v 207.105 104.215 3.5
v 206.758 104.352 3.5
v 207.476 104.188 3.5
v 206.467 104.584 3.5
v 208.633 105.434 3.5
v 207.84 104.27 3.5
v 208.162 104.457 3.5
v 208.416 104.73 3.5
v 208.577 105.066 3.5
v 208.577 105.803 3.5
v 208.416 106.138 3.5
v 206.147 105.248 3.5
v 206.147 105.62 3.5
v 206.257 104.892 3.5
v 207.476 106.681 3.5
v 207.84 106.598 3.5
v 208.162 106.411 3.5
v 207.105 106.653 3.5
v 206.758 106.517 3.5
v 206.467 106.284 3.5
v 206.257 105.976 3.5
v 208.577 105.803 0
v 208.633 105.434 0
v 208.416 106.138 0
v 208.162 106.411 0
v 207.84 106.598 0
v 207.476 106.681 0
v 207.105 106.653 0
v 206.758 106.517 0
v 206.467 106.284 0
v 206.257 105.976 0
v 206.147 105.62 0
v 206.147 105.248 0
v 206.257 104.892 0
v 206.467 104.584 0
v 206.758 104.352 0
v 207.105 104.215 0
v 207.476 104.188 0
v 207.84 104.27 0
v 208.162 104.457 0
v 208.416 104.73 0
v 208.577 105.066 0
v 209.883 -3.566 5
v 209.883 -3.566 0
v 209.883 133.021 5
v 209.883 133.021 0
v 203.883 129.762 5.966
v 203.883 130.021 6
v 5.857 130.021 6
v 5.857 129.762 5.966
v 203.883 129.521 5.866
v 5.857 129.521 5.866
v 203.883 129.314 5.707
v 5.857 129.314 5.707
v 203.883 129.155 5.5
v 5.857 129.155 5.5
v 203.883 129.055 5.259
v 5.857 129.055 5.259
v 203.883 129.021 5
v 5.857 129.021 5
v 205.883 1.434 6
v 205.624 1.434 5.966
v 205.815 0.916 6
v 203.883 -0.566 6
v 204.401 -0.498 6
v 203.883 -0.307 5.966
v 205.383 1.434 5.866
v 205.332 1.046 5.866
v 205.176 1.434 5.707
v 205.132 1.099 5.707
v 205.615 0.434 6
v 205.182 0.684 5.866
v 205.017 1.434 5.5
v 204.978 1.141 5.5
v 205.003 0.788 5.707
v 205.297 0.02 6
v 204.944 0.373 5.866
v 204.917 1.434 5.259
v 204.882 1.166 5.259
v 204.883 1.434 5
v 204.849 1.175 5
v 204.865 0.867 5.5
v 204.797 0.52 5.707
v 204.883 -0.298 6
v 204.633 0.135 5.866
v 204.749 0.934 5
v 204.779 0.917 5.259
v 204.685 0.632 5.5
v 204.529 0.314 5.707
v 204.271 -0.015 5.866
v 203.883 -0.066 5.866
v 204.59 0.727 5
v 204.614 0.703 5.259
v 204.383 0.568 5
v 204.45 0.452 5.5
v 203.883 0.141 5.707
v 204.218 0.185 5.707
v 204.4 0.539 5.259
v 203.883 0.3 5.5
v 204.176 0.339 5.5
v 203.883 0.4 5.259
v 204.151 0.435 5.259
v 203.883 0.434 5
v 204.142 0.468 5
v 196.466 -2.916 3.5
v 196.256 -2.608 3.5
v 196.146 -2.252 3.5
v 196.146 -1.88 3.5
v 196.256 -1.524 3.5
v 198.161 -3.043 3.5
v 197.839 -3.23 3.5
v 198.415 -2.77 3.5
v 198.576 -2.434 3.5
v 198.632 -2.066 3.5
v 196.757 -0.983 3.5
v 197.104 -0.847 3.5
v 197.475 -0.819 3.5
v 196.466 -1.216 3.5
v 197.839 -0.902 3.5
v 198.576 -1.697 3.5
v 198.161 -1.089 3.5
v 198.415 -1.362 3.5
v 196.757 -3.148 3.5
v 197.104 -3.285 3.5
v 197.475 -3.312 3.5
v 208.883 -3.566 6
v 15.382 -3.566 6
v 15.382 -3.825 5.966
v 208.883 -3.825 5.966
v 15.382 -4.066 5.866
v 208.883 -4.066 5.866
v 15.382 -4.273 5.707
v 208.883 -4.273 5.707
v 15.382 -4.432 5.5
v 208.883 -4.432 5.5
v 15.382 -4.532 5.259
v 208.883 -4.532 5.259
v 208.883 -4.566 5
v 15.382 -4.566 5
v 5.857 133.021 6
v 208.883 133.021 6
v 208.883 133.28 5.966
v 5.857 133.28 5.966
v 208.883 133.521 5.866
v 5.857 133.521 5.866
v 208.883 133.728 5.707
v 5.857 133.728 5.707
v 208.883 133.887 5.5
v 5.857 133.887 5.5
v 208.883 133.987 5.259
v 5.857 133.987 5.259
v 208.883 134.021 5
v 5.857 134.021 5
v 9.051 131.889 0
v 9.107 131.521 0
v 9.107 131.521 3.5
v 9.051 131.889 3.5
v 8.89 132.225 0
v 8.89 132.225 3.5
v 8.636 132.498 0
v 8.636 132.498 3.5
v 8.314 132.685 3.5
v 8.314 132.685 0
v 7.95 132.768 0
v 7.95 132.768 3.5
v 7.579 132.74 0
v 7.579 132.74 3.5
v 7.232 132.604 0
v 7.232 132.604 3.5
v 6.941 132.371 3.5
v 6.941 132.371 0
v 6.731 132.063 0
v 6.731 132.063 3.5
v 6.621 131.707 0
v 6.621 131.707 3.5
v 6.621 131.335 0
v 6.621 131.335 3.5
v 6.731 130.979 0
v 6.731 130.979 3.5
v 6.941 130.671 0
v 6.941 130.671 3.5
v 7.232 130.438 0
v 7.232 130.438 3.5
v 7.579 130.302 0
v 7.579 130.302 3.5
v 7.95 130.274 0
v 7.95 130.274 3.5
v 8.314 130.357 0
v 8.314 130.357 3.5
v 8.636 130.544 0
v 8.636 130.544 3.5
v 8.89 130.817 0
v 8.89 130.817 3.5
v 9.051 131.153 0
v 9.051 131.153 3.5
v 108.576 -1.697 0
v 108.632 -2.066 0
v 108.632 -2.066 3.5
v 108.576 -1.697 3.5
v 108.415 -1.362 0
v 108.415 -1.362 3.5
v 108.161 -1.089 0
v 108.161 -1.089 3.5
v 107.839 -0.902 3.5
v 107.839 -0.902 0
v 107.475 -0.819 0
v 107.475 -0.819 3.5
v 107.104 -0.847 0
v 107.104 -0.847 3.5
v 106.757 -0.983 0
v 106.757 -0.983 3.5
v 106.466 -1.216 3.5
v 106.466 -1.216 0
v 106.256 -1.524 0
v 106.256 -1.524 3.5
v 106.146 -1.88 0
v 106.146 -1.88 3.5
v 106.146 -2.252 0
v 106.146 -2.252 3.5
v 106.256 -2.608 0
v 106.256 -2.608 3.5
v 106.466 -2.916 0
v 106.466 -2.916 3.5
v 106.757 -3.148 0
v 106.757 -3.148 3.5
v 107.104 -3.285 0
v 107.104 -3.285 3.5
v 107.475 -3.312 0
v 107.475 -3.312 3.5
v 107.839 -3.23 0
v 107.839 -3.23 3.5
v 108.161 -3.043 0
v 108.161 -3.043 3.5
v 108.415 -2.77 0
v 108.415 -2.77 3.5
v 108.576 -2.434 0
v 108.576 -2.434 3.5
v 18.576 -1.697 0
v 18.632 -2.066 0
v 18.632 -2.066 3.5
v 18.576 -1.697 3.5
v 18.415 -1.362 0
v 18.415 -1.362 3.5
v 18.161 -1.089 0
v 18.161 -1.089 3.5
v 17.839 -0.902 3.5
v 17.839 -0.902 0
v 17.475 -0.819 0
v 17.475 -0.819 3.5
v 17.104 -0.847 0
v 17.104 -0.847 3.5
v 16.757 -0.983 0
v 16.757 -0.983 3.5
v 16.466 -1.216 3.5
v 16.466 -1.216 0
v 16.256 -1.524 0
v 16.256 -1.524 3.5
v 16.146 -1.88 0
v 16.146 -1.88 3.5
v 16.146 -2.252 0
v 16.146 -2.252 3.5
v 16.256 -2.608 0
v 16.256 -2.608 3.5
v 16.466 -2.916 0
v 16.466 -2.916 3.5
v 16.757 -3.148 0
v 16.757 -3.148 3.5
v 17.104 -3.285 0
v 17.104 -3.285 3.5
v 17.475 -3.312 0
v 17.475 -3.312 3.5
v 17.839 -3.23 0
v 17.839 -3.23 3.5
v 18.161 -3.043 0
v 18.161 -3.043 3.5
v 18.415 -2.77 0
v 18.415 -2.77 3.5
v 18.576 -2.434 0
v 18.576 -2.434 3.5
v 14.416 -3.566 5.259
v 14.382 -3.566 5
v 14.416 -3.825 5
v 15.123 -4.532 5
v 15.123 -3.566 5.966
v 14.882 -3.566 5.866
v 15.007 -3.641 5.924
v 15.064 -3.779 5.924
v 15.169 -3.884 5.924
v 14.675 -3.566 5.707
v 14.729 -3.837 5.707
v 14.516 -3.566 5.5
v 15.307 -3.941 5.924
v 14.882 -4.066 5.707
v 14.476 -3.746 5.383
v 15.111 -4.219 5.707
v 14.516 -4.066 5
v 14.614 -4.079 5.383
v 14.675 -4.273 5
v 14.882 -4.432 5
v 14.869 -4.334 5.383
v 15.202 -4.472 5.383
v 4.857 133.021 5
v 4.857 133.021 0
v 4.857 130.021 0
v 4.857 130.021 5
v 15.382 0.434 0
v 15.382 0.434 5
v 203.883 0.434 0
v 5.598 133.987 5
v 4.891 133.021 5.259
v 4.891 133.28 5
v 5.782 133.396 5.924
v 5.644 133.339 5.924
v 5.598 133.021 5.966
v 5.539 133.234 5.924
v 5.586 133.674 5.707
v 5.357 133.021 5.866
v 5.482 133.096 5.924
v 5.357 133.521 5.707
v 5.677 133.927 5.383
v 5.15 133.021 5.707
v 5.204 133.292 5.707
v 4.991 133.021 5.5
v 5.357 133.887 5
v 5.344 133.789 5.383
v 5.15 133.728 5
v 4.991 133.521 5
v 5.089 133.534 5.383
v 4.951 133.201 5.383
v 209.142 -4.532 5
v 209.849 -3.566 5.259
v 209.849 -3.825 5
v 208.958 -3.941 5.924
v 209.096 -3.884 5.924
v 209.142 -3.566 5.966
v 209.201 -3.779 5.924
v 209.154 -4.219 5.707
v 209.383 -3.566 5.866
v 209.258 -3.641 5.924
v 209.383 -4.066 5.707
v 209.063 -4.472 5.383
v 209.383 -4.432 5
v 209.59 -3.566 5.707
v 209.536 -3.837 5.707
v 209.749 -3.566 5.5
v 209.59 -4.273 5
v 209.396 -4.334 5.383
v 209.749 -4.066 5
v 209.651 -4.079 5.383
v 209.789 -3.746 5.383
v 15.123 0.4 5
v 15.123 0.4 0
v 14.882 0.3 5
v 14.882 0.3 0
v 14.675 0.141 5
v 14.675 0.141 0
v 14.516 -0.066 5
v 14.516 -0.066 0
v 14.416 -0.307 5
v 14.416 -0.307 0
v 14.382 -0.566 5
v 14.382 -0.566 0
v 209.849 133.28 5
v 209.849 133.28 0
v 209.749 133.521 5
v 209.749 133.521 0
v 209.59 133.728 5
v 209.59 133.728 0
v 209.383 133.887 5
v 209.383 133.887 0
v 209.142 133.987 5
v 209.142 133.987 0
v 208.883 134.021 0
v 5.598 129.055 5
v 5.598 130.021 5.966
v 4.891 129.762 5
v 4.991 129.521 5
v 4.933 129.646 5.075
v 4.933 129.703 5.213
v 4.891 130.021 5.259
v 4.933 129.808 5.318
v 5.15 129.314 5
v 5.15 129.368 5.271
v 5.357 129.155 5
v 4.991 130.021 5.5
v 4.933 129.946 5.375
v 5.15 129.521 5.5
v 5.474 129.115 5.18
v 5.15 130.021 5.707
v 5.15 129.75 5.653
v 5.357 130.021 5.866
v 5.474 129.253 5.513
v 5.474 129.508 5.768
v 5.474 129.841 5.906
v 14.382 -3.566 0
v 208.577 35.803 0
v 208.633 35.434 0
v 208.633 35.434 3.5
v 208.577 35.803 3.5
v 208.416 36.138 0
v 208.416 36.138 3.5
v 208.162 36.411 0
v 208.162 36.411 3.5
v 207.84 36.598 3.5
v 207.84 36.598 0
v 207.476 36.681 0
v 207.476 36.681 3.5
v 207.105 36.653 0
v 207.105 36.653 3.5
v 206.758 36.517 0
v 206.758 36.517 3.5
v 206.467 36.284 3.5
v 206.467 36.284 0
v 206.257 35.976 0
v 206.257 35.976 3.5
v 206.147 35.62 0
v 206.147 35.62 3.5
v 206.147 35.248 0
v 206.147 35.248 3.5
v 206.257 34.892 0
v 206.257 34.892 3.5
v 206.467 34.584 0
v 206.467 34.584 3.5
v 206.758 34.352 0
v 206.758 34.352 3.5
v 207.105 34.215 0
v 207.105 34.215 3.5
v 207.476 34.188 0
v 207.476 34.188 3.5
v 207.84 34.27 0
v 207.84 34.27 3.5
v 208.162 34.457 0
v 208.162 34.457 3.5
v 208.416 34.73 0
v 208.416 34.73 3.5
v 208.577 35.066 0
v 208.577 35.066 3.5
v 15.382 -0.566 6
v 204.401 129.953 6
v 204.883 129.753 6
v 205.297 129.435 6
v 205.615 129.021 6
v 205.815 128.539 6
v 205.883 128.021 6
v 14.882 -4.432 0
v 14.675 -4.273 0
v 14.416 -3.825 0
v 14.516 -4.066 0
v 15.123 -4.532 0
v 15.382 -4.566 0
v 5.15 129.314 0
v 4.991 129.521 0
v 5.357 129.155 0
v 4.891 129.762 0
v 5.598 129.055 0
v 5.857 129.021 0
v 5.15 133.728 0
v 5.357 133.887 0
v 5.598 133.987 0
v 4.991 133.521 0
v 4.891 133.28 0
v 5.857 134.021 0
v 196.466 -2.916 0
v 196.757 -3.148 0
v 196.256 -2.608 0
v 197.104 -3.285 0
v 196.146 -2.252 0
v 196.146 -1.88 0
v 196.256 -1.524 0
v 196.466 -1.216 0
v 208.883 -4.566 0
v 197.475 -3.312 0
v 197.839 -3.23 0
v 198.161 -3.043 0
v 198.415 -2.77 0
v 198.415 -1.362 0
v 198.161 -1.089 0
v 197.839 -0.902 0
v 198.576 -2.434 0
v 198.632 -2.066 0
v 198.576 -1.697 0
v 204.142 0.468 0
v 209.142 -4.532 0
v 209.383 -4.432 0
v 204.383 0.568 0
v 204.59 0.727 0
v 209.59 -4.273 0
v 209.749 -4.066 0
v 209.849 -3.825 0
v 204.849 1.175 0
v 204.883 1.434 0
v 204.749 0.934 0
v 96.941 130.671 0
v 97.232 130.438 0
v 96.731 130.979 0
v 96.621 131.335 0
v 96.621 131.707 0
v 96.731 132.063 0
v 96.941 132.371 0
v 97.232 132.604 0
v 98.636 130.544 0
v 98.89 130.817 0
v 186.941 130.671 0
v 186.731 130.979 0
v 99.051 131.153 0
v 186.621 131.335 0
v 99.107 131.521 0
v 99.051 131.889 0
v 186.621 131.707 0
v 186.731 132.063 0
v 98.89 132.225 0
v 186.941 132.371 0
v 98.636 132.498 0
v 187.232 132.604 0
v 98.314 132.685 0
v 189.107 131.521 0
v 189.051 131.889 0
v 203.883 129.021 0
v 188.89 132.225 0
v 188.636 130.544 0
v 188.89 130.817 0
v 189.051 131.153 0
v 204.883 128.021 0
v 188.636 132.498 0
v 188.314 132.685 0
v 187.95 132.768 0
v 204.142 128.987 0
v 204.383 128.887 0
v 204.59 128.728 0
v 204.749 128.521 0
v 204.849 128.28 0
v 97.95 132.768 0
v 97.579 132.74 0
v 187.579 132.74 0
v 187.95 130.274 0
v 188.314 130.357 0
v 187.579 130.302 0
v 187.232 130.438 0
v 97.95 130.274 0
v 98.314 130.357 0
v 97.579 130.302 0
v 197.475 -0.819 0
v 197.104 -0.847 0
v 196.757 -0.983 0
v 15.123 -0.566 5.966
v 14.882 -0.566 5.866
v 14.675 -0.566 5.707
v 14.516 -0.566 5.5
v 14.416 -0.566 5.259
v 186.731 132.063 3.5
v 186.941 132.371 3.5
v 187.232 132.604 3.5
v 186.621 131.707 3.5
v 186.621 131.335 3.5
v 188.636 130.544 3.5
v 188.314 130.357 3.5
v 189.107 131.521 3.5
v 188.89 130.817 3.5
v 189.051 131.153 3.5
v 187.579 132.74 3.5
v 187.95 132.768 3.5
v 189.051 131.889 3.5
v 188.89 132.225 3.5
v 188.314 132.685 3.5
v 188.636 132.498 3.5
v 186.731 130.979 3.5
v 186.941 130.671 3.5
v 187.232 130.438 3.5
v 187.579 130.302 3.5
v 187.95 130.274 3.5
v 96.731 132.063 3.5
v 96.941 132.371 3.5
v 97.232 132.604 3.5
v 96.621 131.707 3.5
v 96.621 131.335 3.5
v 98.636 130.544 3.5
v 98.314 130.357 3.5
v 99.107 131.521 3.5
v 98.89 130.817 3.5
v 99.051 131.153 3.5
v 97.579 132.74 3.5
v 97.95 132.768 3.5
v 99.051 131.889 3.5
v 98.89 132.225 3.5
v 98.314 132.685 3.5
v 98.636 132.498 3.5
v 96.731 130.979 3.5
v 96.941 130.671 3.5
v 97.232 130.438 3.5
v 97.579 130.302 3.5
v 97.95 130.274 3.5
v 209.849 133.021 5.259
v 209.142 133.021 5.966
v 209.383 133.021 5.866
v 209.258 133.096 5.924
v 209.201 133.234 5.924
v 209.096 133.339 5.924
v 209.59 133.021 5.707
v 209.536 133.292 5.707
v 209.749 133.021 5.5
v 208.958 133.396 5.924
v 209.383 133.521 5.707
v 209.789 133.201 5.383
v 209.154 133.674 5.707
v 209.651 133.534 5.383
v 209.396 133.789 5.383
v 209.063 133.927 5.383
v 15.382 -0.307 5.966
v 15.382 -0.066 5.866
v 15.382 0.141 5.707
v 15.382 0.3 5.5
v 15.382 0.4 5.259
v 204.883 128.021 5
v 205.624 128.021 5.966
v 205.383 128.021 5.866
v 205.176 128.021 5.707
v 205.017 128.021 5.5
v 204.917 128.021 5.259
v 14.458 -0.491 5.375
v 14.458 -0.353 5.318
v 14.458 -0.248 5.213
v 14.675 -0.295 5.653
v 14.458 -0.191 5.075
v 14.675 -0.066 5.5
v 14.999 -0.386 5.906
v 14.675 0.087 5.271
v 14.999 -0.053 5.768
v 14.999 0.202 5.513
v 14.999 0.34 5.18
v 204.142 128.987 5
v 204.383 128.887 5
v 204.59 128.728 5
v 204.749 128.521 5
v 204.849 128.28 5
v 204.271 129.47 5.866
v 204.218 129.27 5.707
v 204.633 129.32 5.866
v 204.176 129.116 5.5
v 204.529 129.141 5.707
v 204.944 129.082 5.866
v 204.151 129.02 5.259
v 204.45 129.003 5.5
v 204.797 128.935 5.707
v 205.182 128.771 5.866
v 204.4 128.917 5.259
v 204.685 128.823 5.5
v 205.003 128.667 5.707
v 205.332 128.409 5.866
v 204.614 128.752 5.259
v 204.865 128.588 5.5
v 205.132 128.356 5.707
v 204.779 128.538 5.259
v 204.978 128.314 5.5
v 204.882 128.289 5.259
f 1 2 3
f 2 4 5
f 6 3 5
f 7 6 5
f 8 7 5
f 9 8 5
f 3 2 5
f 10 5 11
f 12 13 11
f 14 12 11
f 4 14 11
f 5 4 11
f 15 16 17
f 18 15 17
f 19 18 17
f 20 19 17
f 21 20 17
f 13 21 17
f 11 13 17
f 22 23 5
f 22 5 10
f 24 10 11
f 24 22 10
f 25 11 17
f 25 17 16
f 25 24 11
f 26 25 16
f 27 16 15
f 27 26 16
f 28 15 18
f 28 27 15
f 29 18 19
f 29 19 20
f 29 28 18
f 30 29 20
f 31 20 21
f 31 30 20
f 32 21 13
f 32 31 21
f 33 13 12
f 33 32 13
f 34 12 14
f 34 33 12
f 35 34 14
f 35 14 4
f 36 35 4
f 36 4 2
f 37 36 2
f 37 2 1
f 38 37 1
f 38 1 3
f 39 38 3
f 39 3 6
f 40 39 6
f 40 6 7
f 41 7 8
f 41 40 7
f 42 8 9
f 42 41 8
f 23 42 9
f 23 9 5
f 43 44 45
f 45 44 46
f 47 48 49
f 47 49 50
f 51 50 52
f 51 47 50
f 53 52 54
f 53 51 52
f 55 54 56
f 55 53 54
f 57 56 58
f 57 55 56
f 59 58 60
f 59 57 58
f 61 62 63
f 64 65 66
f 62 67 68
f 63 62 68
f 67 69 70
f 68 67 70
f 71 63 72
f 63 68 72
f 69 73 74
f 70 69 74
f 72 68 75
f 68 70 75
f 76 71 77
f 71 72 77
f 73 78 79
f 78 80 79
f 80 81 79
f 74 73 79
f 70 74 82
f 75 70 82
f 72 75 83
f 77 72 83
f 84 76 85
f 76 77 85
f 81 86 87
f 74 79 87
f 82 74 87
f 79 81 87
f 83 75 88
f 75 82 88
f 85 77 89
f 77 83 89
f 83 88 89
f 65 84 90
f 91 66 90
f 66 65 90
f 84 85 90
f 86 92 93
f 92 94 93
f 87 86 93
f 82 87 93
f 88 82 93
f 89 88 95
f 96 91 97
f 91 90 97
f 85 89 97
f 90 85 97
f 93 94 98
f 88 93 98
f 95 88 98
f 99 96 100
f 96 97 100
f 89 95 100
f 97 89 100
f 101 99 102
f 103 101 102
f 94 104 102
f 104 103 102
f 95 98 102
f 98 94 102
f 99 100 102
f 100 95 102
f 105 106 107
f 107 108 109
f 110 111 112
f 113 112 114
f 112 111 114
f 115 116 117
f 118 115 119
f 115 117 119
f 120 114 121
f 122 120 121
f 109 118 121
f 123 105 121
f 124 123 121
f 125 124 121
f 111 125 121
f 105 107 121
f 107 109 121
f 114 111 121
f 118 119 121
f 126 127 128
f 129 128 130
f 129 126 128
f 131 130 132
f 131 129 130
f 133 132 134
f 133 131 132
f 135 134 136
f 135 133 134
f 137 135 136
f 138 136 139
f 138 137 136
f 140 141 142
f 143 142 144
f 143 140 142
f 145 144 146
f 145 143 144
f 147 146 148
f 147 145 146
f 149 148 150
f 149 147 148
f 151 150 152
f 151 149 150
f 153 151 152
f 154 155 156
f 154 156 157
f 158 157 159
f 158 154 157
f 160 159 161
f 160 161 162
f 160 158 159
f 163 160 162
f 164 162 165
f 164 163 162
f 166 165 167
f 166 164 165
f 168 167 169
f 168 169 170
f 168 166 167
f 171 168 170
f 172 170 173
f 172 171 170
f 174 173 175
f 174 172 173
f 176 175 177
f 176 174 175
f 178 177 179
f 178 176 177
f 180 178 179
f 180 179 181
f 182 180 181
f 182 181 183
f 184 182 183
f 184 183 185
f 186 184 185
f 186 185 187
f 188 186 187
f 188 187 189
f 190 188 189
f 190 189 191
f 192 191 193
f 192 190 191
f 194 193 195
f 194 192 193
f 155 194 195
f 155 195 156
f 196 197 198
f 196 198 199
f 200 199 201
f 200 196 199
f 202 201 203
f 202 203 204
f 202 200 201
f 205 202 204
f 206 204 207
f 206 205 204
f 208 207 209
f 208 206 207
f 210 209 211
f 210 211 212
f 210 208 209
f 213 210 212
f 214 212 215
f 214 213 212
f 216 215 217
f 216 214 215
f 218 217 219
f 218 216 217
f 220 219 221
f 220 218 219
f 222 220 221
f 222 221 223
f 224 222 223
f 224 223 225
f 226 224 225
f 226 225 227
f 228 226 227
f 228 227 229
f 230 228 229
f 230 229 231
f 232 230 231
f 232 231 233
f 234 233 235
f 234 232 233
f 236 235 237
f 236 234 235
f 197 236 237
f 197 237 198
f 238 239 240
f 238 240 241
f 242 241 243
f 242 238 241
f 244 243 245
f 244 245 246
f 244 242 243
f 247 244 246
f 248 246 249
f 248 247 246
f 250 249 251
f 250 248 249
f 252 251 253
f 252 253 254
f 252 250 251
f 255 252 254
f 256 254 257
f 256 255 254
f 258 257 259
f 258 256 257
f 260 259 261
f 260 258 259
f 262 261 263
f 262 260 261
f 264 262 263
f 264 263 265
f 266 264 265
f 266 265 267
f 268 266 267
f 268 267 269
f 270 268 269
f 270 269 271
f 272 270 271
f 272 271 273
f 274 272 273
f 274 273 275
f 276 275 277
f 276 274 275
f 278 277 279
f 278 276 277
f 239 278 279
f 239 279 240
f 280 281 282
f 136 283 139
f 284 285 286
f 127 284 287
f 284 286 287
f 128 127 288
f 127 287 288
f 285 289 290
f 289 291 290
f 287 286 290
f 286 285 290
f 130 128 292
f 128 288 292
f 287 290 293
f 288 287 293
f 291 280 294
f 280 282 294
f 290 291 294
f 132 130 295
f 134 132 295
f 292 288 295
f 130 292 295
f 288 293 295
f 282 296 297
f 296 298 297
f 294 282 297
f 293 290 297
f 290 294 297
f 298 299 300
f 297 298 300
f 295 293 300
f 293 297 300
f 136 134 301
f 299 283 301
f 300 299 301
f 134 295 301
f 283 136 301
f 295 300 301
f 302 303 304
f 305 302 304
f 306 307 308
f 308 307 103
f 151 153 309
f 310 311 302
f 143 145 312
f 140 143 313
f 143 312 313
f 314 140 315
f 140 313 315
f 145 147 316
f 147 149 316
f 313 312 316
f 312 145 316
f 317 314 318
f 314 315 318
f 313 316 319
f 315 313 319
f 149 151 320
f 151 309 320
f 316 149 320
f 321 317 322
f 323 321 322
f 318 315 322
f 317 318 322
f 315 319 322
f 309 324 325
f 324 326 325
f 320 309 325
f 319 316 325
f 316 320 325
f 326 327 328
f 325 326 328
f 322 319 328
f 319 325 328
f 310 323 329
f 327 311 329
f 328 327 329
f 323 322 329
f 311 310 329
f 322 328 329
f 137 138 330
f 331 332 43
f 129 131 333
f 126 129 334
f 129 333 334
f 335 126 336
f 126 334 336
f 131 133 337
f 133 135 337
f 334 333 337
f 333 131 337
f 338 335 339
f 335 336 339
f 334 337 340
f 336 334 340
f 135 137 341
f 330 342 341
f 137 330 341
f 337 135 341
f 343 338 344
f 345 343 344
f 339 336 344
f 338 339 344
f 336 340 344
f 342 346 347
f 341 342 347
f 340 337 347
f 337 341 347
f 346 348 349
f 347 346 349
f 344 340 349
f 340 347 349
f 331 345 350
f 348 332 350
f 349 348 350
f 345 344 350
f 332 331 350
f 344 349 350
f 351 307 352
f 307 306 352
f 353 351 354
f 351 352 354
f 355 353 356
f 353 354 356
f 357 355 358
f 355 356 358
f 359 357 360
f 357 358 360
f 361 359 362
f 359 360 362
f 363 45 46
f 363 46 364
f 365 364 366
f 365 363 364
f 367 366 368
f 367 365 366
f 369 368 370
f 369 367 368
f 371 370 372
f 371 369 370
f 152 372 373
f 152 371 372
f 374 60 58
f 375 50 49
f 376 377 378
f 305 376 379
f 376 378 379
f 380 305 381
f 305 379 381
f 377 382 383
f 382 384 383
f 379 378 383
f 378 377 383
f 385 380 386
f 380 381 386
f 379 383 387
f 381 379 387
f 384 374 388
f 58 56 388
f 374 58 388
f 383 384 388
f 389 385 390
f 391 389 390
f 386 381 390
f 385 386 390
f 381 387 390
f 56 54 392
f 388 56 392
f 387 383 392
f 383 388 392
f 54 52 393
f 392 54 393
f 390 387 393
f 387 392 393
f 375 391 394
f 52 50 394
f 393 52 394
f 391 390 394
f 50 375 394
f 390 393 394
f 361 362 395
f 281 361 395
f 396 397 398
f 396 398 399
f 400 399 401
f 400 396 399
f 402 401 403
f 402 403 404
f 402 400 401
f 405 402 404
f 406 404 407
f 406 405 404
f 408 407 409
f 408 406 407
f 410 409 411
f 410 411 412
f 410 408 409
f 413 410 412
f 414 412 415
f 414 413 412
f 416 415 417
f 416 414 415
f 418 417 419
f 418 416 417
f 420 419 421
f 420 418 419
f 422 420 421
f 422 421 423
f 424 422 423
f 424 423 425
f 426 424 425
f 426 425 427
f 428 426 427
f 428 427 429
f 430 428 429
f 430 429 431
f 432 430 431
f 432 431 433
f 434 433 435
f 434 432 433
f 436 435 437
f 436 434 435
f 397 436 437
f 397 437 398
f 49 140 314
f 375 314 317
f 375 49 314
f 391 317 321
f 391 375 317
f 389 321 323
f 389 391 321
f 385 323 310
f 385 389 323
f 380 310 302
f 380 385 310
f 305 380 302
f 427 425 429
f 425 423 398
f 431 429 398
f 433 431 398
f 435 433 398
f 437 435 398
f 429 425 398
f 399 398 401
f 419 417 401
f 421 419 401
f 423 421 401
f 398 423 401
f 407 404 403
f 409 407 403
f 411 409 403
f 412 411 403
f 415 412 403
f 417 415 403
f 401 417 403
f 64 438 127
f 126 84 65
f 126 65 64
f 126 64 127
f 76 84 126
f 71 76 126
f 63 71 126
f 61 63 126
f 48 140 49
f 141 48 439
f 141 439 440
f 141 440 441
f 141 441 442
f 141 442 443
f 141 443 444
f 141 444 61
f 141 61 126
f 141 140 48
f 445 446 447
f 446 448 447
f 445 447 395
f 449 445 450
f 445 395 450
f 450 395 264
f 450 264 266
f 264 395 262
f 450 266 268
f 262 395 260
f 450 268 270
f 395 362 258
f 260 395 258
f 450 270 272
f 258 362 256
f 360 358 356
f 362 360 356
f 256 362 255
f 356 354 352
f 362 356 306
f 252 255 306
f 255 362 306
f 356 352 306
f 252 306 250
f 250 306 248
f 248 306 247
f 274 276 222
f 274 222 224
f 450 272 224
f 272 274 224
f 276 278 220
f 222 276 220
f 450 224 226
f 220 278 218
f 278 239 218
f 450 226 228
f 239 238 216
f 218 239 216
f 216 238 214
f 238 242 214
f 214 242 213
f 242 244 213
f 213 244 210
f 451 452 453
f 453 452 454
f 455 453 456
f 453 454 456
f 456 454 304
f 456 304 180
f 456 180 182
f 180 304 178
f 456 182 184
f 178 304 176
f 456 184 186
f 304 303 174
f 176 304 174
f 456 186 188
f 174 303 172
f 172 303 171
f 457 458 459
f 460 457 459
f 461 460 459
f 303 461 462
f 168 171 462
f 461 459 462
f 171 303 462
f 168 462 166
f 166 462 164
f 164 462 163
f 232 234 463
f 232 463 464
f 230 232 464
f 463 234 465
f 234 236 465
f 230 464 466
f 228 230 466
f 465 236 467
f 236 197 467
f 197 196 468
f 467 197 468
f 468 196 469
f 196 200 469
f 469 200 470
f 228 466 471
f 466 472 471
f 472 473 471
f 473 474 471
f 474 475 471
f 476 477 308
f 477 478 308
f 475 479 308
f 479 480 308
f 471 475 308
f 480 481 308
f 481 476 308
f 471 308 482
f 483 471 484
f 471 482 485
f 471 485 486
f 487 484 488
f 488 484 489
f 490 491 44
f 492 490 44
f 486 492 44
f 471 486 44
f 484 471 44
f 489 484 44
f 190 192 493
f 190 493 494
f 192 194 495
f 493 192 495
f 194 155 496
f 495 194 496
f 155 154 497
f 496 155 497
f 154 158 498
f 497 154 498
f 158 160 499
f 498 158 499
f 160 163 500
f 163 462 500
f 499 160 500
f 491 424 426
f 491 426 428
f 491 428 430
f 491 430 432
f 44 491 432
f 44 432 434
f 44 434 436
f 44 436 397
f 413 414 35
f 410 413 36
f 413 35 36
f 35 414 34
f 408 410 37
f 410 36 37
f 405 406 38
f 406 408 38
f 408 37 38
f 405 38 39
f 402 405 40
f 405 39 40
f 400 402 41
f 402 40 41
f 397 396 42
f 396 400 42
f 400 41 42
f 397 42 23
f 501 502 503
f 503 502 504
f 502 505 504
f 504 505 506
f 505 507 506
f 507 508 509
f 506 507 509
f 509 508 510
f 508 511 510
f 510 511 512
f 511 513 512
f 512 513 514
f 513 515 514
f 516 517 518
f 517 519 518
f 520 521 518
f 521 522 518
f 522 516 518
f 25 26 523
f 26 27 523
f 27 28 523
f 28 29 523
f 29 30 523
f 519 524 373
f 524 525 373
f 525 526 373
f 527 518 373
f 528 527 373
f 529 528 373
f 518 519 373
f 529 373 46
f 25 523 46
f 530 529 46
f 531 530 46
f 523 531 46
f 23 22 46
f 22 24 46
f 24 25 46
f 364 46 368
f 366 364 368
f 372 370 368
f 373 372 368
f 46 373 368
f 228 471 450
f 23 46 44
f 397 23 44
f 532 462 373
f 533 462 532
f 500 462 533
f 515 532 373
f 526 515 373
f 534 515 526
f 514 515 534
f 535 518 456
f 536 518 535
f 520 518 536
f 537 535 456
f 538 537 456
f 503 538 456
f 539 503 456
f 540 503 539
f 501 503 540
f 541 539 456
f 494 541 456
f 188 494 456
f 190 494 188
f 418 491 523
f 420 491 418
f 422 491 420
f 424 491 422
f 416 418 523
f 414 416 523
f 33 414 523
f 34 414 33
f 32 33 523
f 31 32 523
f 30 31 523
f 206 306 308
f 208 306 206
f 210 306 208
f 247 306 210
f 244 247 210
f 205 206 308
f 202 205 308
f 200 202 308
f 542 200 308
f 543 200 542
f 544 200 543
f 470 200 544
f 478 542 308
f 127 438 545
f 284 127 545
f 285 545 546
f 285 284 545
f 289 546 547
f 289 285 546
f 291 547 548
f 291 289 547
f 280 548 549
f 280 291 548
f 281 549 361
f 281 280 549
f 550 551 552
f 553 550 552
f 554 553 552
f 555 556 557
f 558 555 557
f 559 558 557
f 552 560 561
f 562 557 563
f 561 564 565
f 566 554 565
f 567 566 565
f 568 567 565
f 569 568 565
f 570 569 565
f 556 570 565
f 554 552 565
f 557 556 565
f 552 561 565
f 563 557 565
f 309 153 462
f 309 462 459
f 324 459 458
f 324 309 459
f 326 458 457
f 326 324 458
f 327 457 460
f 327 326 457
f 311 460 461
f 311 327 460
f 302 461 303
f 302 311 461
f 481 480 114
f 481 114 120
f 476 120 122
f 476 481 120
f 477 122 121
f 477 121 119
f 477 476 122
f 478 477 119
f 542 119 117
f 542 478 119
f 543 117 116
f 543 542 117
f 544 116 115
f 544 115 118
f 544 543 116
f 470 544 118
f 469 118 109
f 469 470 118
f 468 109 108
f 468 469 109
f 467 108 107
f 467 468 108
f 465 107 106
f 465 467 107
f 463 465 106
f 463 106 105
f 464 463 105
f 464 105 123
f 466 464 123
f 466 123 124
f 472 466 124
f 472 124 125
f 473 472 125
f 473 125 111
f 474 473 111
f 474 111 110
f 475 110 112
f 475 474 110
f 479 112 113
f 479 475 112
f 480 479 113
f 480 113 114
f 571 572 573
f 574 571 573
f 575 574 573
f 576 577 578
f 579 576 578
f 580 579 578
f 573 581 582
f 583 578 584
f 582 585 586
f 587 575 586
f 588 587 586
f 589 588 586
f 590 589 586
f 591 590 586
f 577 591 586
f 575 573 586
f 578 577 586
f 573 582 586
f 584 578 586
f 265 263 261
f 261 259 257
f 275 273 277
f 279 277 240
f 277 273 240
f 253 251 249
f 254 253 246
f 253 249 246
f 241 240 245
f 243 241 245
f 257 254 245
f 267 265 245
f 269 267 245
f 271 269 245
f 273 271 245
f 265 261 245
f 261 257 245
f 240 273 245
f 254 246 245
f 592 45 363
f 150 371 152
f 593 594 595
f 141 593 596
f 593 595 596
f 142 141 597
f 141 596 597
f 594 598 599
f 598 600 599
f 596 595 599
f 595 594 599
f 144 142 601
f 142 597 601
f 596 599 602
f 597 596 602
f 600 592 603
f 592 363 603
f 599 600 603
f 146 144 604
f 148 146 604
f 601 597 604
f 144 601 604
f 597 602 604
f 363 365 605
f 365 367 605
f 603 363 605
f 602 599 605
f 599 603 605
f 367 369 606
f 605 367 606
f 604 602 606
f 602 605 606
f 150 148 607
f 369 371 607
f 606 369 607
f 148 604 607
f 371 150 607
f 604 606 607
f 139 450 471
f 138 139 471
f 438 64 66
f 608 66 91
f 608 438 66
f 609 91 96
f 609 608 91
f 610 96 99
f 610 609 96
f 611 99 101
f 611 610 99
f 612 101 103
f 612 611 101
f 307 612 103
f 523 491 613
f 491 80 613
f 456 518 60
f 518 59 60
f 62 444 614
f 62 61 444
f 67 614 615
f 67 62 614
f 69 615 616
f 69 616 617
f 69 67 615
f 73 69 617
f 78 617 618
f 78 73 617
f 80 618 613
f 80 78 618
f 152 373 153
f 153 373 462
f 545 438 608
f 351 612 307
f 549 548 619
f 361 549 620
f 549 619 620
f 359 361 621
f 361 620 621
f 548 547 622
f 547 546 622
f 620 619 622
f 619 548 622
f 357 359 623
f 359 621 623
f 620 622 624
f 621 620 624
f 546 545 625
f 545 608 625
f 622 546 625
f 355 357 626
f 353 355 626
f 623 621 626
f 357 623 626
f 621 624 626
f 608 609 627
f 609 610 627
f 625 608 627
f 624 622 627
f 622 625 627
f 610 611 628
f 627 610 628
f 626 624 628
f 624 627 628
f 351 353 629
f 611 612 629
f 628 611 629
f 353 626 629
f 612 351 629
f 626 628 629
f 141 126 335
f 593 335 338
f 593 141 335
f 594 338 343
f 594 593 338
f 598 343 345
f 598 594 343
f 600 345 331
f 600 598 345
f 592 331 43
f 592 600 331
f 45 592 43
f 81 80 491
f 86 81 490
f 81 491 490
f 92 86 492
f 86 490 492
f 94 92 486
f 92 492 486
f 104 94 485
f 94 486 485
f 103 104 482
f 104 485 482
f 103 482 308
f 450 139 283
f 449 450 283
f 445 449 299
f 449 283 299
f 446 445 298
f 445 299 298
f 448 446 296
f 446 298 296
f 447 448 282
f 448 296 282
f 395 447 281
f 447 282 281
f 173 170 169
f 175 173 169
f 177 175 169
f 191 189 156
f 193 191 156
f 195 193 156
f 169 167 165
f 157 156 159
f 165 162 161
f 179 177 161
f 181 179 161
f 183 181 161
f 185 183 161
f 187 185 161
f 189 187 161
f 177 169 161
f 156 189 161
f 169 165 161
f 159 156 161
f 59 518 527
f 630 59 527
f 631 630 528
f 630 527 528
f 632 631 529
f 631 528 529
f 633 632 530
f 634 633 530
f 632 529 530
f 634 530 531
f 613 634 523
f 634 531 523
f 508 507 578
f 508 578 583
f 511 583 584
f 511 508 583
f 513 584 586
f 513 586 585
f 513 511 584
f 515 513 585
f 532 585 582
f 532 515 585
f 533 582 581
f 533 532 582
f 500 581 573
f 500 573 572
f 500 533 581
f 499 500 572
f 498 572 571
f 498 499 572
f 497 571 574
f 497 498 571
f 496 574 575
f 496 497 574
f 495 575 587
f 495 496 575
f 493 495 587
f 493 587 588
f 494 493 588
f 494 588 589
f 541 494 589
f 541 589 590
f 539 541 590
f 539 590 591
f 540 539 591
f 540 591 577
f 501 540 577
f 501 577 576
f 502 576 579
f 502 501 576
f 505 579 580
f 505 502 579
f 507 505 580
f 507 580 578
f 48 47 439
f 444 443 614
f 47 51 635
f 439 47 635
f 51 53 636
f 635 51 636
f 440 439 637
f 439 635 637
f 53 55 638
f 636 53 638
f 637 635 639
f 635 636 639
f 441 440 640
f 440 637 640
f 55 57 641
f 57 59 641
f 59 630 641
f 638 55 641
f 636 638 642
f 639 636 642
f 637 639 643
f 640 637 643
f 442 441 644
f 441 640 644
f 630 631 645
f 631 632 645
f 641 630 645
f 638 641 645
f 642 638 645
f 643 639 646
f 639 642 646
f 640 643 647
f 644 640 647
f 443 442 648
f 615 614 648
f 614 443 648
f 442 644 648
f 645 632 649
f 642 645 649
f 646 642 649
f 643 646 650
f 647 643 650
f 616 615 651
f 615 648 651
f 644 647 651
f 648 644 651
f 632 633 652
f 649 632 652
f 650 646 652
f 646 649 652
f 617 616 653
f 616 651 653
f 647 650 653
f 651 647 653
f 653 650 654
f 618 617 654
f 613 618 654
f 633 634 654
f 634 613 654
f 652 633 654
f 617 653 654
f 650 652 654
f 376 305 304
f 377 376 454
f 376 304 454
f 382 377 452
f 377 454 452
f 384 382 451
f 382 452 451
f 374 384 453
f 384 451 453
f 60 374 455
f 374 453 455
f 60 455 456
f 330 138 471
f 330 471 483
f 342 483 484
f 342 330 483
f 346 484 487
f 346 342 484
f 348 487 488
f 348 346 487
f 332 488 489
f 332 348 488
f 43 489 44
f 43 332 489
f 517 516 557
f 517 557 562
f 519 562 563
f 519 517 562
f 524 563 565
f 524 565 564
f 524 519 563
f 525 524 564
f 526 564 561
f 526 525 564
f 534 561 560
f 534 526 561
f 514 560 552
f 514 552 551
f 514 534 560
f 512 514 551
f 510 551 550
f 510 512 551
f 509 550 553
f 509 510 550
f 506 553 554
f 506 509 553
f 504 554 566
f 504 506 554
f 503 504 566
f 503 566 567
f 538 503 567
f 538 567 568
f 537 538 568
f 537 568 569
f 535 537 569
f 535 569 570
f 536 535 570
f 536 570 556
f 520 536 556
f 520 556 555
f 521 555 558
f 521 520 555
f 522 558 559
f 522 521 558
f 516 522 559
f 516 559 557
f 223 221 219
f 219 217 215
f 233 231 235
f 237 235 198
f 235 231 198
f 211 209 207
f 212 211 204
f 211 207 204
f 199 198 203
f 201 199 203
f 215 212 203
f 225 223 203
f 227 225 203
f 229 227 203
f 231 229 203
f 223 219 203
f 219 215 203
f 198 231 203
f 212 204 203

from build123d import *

# Parameters (mm, degrees)
MODEL_W                = 13.999
MODEL_H                = 13.99947
MODEL_W_2              = 13.9993
MODEL_H_2              = 13.99948
MODEL_W_3              = 14.0009
MODEL_H_3              = 13.9994
MODEL_W_4              = 14
MODEL_W_5              = 13.9994
MODEL_H_4              = 13.9992
MODEL_W_6              = 13.9998
MODEL_W_7              = 13.99955
MODEL_W_8              = 14.0007
MODEL_W_9              = 14.001
MODEL_W_10             = 13.99954
MODEL_H_5              = 13.999
EXTRUDE_1_DEPTH        = 3
EXTRUDE_START          = -3
EXTRUDE_2_DEPTH        = 6
CUT_EXTRUDE_START      = -3
SKETCH_2_R             = 1.25
CUT_EXTRUDE_1_DEPTH    = 3.5
FILLET_1_R             = 1
PATTERN_LINEAR_1_COUNT = 3
PATTERN_LINEAR_1_PITCH = 90
SKETCH_3_R             = 1.25
CUT_EXTRUDE_2_DEPTH    = 3.5
PATTERN_LINEAR_2_COUNT = 3
PATTERN_LINEAR_2_PITCH = 70
CUT_EXTRUDE_3_DEPTH    = 10
FILLET_2_R             = 1


with BuildPart() as part:
    # Model → 凸台-拉伸1 (new body)
    with BuildSketch(Plane.XY):
        Polygon((4.85693, 129.021), (204.883, 129.021), (204.883, 0.434082), (14.38193, 0.434082), (14.38193, 24.241), (23.90693, 24.241), (23.90693, 43.291), (14.38193, 43.291), (14.38193, 62.341), (9.61893, 62.341), (9.61893, 81.391), (0.09393, 81.391), (0.09393, 109.971), (4.85693, 109.971), align=None)
        with Locations((152.4945, 9.959765)):
            Rectangle(MODEL_W, MODEL_H, mode=Mode.SUBTRACT)
        with Locations((171.5445, 9.959765)):
            Rectangle(MODEL_W, MODEL_H, mode=Mode.SUBTRACT)
        with Locations((190.5945, 9.959765)):
            Rectangle(MODEL_W, MODEL_H, mode=Mode.SUBTRACT)
        Polygon((33.5759, 21.722), (33.5759, 17.0215), (32.0504, 17.0215), (32.0504, 20.2517), (30.3251, 20.2517), (30.3251, 21.1722), (27.0261, 21.1722), (27.0261, 20.2517), (25.3008, 20.2517), (25.3008, 17.0215), (24.4753, 17.0215), (24.4753, 14.2227), (25.3008, 14.2227), (25.3008, 7.95267), (27.0261, 7.95267), (27.0261, 6.97286), (30.3251, 6.97286), (30.3251, 7.95267), (32.0504, 7.95267), (32.0504, 12.4216), (33.5759, 12.4216), (33.5759, 7.72252), (47.5753, 7.72252), (47.5753, 12.4216), (49.101, 12.4216), (49.101, 7.95267), (50.8247, 7.95267), (50.8247, 6.97286), (54.1253, 6.97286), (54.1253, 7.95267), (55.8504, 7.95267), (55.8504, 14.2227), (56.6759, 14.2227), (56.6759, 17.0215), (55.8504, 17.0215), (55.8504, 20.2517), (54.1253, 20.2517), (54.1253, 21.1722), (50.8247, 21.1722), (50.8247, 20.2517), (49.101, 20.2517), (49.101, 17.0215), (47.5753, 17.0215), (47.5753, 21.722), align=None, mode=Mode.SUBTRACT)
        with Locations((78.67565, 14.72226)):
            Rectangle(MODEL_W_2, MODEL_H_2, mode=Mode.SUBTRACT)
        with Locations((102.48755, 14.72226)):
            Rectangle(MODEL_W_3, MODEL_H_2, mode=Mode.SUBTRACT)
        with Locations((126.3005, 14.72226)):
            Rectangle(MODEL_W, MODEL_H_2, mode=Mode.SUBTRACT)
        with Locations((171.5445, 29.0097)):
            Rectangle(MODEL_W, MODEL_H_3, mode=Mode.SUBTRACT)
        with Locations((33.43185, 33.7722)):
            Rectangle(MODEL_W_2, MODEL_H_3, mode=Mode.SUBTRACT)
        with Locations((52.48185, 33.7722)):
            Rectangle(MODEL_W_2, MODEL_H_3, mode=Mode.SUBTRACT)
        with Locations((71.53185, 33.7722)):
            Rectangle(MODEL_W_2, MODEL_H_3, mode=Mode.SUBTRACT)
        with Locations((90.58185, 33.7722)):
            Rectangle(MODEL_W_2, MODEL_H_3, mode=Mode.SUBTRACT)
        with Locations((109.632, 33.7722)):
            Rectangle(MODEL_W_4, MODEL_H_3, mode=Mode.SUBTRACT)
        with Locations((135.8255, 33.7722)):
            Rectangle(MODEL_W, MODEL_H_3, mode=Mode.SUBTRACT)
        with Locations((195.357, 33.7722)):
            Rectangle(MODEL_W_4, MODEL_H_3, mode=Mode.SUBTRACT)
        Polygon((143.112, 59.8219), (143.112, 55.1215), (141.588, 55.1215), (141.588, 58.3516), (139.863, 58.3516), (139.863, 59.2723), (136.562, 59.2723), (136.562, 58.3516), (134.837, 58.3516), (134.837, 55.1215), (134.013, 55.1215), (134.013, 52.3226), (134.837, 52.3226), (134.837, 46.0527), (136.562, 46.0527), (136.562, 45.0716), (139.863, 45.0716), (139.863, 46.0527), (141.588, 46.0527), (141.588, 50.5217), (143.112, 50.5217), (143.112, 45.8227), (157.113, 45.8227), (157.113, 50.5217), (158.637, 50.5217), (158.637, 46.0527), (160.362, 46.0527), (160.362, 45.0716), (163.663, 45.0716), (163.663, 46.0527), (165.388, 46.0527), (165.388, 52.3226), (166.212, 52.3226), (166.212, 55.1215), (165.388, 55.1215), (165.388, 58.3516), (163.663, 58.3516), (163.663, 59.2723), (160.362, 59.2723), (160.362, 58.3516), (158.637, 58.3516), (158.637, 55.1215), (157.113, 55.1215), (157.113, 59.8219), align=None, mode=Mode.SUBTRACT)
        with Locations((23.9069, 52.8223)):
            Rectangle(MODEL_W_5, MODEL_H_4, mode=Mode.SUBTRACT)
        with Locations((42.95685, 52.8223)):
            Rectangle(MODEL_W_2, MODEL_H_4, mode=Mode.SUBTRACT)
        with Locations((62.00685, 52.8223)):
            Rectangle(MODEL_W_2, MODEL_H_4, mode=Mode.SUBTRACT)
        with Locations((81.05685, 52.8223)):
            Rectangle(MODEL_W_2, MODEL_H_4, mode=Mode.SUBTRACT)
        with Locations((100.1071, 52.8223)):
            Rectangle(MODEL_W_6, MODEL_H_4, mode=Mode.SUBTRACT)
        with Locations((119.157, 52.8223)):
            Rectangle(MODEL_W_4, MODEL_H_4, mode=Mode.SUBTRACT)
        with Locations((195.357, 52.8223)):
            Rectangle(MODEL_W_4, MODEL_H_4, mode=Mode.SUBTRACT)
        with Locations((19.1444, 71.8723)):
            Rectangle(MODEL_W_5, MODEL_H_4, mode=Mode.SUBTRACT)
        with Locations((38.19435, 71.8723)):
            Rectangle(MODEL_W_2, MODEL_H_4, mode=Mode.SUBTRACT)
        with Locations((57.24435, 71.8723)):
            Rectangle(MODEL_W_2, MODEL_H_4, mode=Mode.SUBTRACT)
        with Locations((76.29435, 71.8723)):
            Rectangle(MODEL_W_2, MODEL_H_4, mode=Mode.SUBTRACT)
        with Locations((95.34435, 71.8723)):
            Rectangle(MODEL_W_2, MODEL_H_4, mode=Mode.SUBTRACT)
        with Locations((114.3945, 71.8723)):
            Rectangle(MODEL_W, MODEL_H_4, mode=Mode.SUBTRACT)
        with Locations((133.4445, 71.8723)):
            Rectangle(MODEL_W, MODEL_H_4, mode=Mode.SUBTRACT)
        with Locations((157.257, 71.8723)):
            Rectangle(MODEL_W_4, MODEL_H_4, mode=Mode.SUBTRACT)
        with Locations((195.357, 71.8723)):
            Rectangle(MODEL_W_4, MODEL_H_4, mode=Mode.SUBTRACT)
        Polygon((145.493, 97.9219), (145.493, 93.2215), (143.969, 93.2215), (143.969, 96.4516), (142.244, 96.4516), (142.244, 97.3723), (138.943, 97.3723), (138.943, 96.4516), (137.218, 96.4516), (137.218, 93.2215), (136.394, 93.2215), (136.394, 90.4226), (137.218, 90.4226), (137.218, 84.1527), (138.943, 84.1527), (138.943, 83.1716), (142.244, 83.1716), (142.244, 84.1527), (143.969, 84.1527), (143.969, 88.6217), (145.493, 88.6217), (145.493, 83.9227), (159.494, 83.9227), (159.494, 88.6217), (161.018, 88.6217), (161.018, 84.1527), (162.743, 84.1527), (162.743, 83.1716), (166.044, 83.1716), (166.044, 84.1527), (167.768, 84.1527), (167.768, 90.4226), (168.593, 90.4226), (168.593, 93.2215), (167.768, 93.2215), (167.768, 96.4516), (166.044, 96.4516), (166.044, 97.3723), (162.743, 97.3723), (162.743, 96.4516), (161.018, 96.4516), (161.018, 93.2215), (159.494, 93.2215), (159.494, 97.9219), align=None, mode=Mode.SUBTRACT)
        with Locations((9.619425, 90.9223)):
            Rectangle(MODEL_W_7, MODEL_H_4, mode=Mode.SUBTRACT)
        with Locations((28.66935, 90.9223)):
            Rectangle(MODEL_W_2, MODEL_H_4, mode=Mode.SUBTRACT)
        with Locations((47.71935, 90.9223)):
            Rectangle(MODEL_W_2, MODEL_H_4, mode=Mode.SUBTRACT)
        with Locations((66.76935, 90.9223)):
            Rectangle(MODEL_W_2, MODEL_H_4, mode=Mode.SUBTRACT)
        with Locations((85.81935, 90.9223)):
            Rectangle(MODEL_W_2, MODEL_H_4, mode=Mode.SUBTRACT)
        with Locations((104.86865, 90.9223)):
            Rectangle(MODEL_W_8, MODEL_H_4, mode=Mode.SUBTRACT)
        with Locations((123.9185, 90.9223)):
            Rectangle(MODEL_W_9, MODEL_H_4, mode=Mode.SUBTRACT)
        with Locations((195.357, 90.9223)):
            Rectangle(MODEL_W_4, MODEL_H_4, mode=Mode.SUBTRACT)
        with Locations((14.38193, 119.4975)):
            Rectangle(MODEL_W_10, MODEL_H_5, mode=Mode.SUBTRACT)
        with Locations((33.43185, 119.4975)):
            Rectangle(MODEL_W_2, MODEL_H_5, mode=Mode.SUBTRACT)
        with Locations((52.48185, 119.4975)):
            Rectangle(MODEL_W_2, MODEL_H_5, mode=Mode.SUBTRACT)
        with Locations((71.53185, 119.4975)):
            Rectangle(MODEL_W_2, MODEL_H_5, mode=Mode.SUBTRACT)
        with Locations((90.58185, 119.4975)):
            Rectangle(MODEL_W_2, MODEL_H_5, mode=Mode.SUBTRACT)
        with Locations((109.632, 119.4975)):
            Rectangle(MODEL_W_4, MODEL_H_5, mode=Mode.SUBTRACT)
        with Locations((128.682, 119.4975)):
            Rectangle(MODEL_W_4, MODEL_H_5, mode=Mode.SUBTRACT)
        with Locations((152.4945, 119.4975)):
            Rectangle(MODEL_W, MODEL_H_5, mode=Mode.SUBTRACT)
        with Locations((171.5445, 119.4975)):
            Rectangle(MODEL_W, MODEL_H_5, mode=Mode.SUBTRACT)
        with Locations((192.9755, 119.4975)):
            Rectangle(MODEL_W, MODEL_H_5, mode=Mode.SUBTRACT)
    extrude(amount=EXTRUDE_1_DEPTH)

    # 草图1 → 凸台-拉伸2 (add)
    with BuildSketch(Plane.XY.offset(3).offset(EXTRUDE_START)):
        Polygon((14.38193, -4.565918), (209.883, -4.565918), (209.883, 134.021), (4.85693, 134.021), (4.85693, 129.021), (204.883, 129.021), (204.883, 0.434082), (14.38193, 0.434082), align=None)
    extrude(amount=EXTRUDE_2_DEPTH)

    # 草图2 → 切除-拉伸1 (cut)
    with BuildSketch(Plane.XY.offset(3).offset(CUT_EXTRUDE_START)):
        with Locations((7.85693, 131.521)):
            Circle(SKETCH_2_R)
        with Locations((17.38193, -2.065918)):
            Circle(SKETCH_2_R)
    cut_extrude_1 = extrude(amount=CUT_EXTRUDE_1_DEPTH, mode=Mode.SUBTRACT)

    # 圆角1
    fillet_1_edges = [part.edges().sort_by_distance(p)[0] for p in [
        (209.883, 134.021, 3),
        (4.85693, 134.021, 3),
        (14.38193, -4.565918, 3),
        (209.883, -4.565918, 3),
    ]]
    fillet(fillet_1_edges, radius=FILLET_1_R)

    # 阵列(线性)1: 切除-拉伸1 ×3
    with Locations(*[(i * PATTERN_LINEAR_1_PITCH, 0, 0) for i in range(1, PATTERN_LINEAR_1_COUNT)]):
        add(cut_extrude_1, mode=Mode.SUBTRACT)

    # 草图3 → 切除-拉伸2 (cut)
    with BuildSketch(Plane.XY.offset(3).offset(CUT_EXTRUDE_START)):
        with Locations((207.383, 35.434082)):
            Circle(SKETCH_3_R)
    cut_extrude_2 = extrude(amount=CUT_EXTRUDE_2_DEPTH, mode=Mode.SUBTRACT)

    # 阵列(线性)2: 切除-拉伸2 ×3
    with Locations(*[(0, i * PATTERN_LINEAR_2_PITCH, 0) for i in range(1, PATTERN_LINEAR_2_COUNT)]):
        add(cut_extrude_2, mode=Mode.SUBTRACT)

    # 草图4 → 切除-拉伸3 (cut)
    with BuildSketch(Plane.XY.offset(3)):
        Polygon((14.38193, 0.434082), (204.883, 0.434082), (204.883, 129.021), (4.85693, 129.021), (0.09393, 129.021), (0.09393, 0.434082), align=None)
    extrude(amount=-CUT_EXTRUDE_3_DEPTH, mode=Mode.SUBTRACT)

    # 圆角2
    fillet_2_edges = [part.edges().sort_by_distance(p)[0] for p in [
        (104.869965, 129.021, 6),
        (4.85693, 129.021, 3),
        (109.632465, 0.434082, 6),
        (204.883, 0.434082, 3),
        (204.883, 64.727541, 6),
        (204.883, 129.021, 3),
        (4.85693, 131.021, 6),
        (14.38193, 0.434082, 3),
        (112.132465, -4.565918, 6),
        (14.38193, -1.565918, 6),
        (107.369965, 134.021, 6),
        (209.883, 64.727541, 6),
        (209.590106781, -4.273024781, 6),
        (209.590106781, 133.728106781, 6),
        (5.149823219, 133.728106781, 6),
        (14.674823219, -4.273024781, 6),
    ]]
    fillet(fillet_2_edges, radius=FILLET_2_R)


solid = part.part
